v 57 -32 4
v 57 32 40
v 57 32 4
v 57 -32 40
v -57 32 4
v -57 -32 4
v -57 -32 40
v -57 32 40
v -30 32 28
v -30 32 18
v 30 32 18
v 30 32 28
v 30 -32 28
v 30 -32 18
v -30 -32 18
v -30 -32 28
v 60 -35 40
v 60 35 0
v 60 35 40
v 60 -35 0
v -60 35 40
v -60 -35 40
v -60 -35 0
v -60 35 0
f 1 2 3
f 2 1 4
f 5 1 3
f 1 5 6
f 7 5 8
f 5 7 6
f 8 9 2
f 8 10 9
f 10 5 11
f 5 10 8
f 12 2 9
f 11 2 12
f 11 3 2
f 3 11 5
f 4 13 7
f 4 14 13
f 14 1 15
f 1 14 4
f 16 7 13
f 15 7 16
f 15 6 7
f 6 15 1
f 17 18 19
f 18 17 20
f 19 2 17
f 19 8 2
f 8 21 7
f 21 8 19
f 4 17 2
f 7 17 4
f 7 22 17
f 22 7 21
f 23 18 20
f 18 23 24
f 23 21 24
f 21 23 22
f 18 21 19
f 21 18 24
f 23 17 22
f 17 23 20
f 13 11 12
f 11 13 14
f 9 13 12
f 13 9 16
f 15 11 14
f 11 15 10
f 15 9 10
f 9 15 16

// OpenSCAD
// Buffer Tank for Mini Horizontal Gel Electrophoresis
// Units: millimetres
// Orientation: Rests on XY plane at z=0, builds upward (+Z)
// Centred on origin in X and Y

$fn = 128; // High resolution for smooth curves and accurate hole sizing

// --- Outer Dimensions (User Measured) ---
W_OUT_X = 120; // Width along X
D_OUT_Y = 70;  // Depth along Y
H_OUT_Z = 40;  // Height along Z

// --- Wall and Floor Thickness ---
T_WALL = 3;    // Wall thickness
T_FLOOR = 3;   // Floor thickness

// --- Inner Dimensions (Calculated) ---
W_IN_X = W_OUT_X - 2*T_WALL;
D_IN_Y = D_OUT_Y - 2*T_WALL;
H_IN_Z = H_OUT_Z - T_FLOOR;

// --- Platform Dimensions ---
P_L_X = 60;    // Platform length along X (total)
P_W_Y = D_IN_Y; // Platform width along Y (full inner width)
P_H_REL = 10;  // Platform height relative to inner floor
// Platform top absolute Z position (relative to tank bottom)
P_Z_ABS = T_FLOOR + P_H_REL; 

// --- Electrode Hole Dimensions ---
D_HOLE = 2;    // Hole diameter
// Hole location: y = 0, z = 30 (relative to bottom of tank)
// Since tank is centred in Y, y=0 is the geometric centre.

// --- Generation ---

module tank_base() {
    // Create the main outer block
    difference() {
        // Outer Shell
        cube([W_OUT_X, D_OUT_Y, H_OUT_Z], center = true);
        
        // Cut out the inner void (open top)
        // Inner dimensions: X, Y, Z
        // We subtract a box that is open at the top (Z > 0 relative to inner floor)
        // To ensure clean cut, we extend slightly past the top face
        translate([0, 0, T_FLOOR]) {
            difference() {
                cube([W_IN_X, D_IN_Y, H_IN_Z + 1], center = true);
                // Cut the top face to make it open
                translate([0, 0, H_IN_Z]) {
                    cube([W_IN_X + 0.1, D_IN_Y + 0.1, 1], center = true);
                }
            }
        }
    }
}

module platform() {
    // Solid raised platform
    // Dimensions: P_L_X (X), P_W_Y (Y), P_H_REL (Z)
    // Position: Centred in X, Full width in Y, Sitting on inner floor
    translate([0, 0, T_FLOOR]) {
        cube([P_L_X, P_W_Y, P_H_REL], center = true);
    }
}

module electrode_holes() {
    // Two holes: Left and Right ends
    // Location: y = 0 (centre), z = 30 (absolute from bottom)
    // Direction: Along X axis
    
    for (i = [-1, 1]) {
        // i = -1 for Left, i = 1 for Right
        // Calculate X position: Center is 0. Ends are at +/- W_OUT_X/2.
        // Hole is at the end wall.
        x_pos = (i * (W_OUT_X / 2)) - (D_HOLE / 2);
        
        translate([x_pos, 0, 30]) {
            cylinder(h = W_OUT_X + 1, r = D_HOLE / 2, $fn = 64);
        }
    }
}

module buffer_tank() {
    union() {
        tank_base();
        platform();
    }
    
    // Apply holes using difference
    difference() {
        // Re-create the solid union to ensure holes cut through everything correctly
        union() {
            tank_base();
            platform();
        }
        
        // Cut the electrode holes
        electrode_holes();
    }
}

// --- Final Assembly ---
// The user specified the part rests on the bed at z=0.
// The internal logic of the tank (bottom at -20, top at 20) was used for symmetry.
// We shift the entire assembly up by 20mm so the bottom touches z=0.
// This places the inner floor at z=3, platform top at z=13, and holes at z=30.
translate([0, 0, 20]) {
    buffer_tank();
}
